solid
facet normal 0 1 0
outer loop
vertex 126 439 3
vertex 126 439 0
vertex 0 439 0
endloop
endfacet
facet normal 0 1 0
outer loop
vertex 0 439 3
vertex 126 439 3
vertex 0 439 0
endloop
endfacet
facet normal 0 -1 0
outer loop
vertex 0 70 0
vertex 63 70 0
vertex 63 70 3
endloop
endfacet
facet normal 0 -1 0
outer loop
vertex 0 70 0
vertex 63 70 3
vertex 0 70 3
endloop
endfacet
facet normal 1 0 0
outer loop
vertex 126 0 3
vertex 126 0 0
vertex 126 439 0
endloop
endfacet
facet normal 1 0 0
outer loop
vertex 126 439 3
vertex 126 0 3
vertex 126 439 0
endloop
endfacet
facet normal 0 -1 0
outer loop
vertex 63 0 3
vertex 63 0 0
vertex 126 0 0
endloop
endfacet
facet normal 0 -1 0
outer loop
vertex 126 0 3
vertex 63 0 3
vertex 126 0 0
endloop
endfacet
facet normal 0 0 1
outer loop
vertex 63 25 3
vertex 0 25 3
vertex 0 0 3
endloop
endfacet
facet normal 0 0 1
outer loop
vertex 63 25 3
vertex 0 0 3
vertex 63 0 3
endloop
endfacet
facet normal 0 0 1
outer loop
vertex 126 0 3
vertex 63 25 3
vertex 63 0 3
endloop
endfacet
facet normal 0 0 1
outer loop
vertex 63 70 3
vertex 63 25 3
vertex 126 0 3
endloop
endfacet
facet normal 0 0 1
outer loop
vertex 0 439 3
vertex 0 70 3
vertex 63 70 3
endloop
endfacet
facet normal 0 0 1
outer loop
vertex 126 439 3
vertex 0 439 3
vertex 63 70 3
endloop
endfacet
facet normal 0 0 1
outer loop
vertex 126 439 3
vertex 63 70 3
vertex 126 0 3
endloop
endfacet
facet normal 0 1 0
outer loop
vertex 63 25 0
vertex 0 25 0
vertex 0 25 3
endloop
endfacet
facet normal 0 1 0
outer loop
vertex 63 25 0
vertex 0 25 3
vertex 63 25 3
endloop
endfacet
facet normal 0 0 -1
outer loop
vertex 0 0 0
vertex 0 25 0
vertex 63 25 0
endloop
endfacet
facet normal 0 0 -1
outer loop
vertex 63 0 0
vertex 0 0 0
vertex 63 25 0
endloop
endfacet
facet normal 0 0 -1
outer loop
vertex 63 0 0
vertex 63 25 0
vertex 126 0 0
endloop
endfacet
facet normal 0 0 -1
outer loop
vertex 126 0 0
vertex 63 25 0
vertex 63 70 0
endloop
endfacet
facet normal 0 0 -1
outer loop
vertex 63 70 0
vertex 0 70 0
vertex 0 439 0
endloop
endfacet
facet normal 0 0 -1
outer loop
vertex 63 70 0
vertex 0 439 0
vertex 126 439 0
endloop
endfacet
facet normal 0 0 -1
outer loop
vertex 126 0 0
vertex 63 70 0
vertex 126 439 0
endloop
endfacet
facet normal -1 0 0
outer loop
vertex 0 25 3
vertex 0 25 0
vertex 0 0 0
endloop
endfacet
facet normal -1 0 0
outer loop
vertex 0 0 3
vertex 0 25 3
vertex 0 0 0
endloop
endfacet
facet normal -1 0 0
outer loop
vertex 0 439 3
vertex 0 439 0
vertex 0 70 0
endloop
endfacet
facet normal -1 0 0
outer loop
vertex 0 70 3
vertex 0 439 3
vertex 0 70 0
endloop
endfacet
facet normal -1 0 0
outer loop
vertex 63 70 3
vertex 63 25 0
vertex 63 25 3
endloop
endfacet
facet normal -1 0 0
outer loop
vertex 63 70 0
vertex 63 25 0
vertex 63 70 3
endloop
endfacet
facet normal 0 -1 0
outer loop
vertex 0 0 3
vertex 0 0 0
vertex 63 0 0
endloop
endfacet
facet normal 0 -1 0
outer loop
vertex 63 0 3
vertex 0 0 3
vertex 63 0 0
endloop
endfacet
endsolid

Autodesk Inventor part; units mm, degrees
ref_plane "YZ Plane" through (0, 0, 0) normal (1, 0, 0) x (0, 1, 0)
ref_plane "XZ Plane" through (0, 0, 0) normal (0, 1, 0) x (-1, 0, 0)
ref_plane "XY Plane" through (0, 0, 0) normal (0, 0, 1) x (1, 0, 0)
sketch "Sketch2" plane through (0, 0, 0) normal (0, 0, 1) x (1, 0, 0)
  line L0 (0, 0) -> (126, 0)
  line L1 (126, 0) -> (126, 439)
  line L2 (126, 439) -> (0, 439)
  line L3 (0, 439) -> (0, 0)
  line L4 (0, 25) -> (63, 25)
  line L5 (63, 0) -> (0, 0)
  line L6 (0, 0) -> (0, 25)
  line L7 (63, 25) -> (63, 70)
  line L8 (63, 70) -> (0, 70)
  point P0 (63, 47.5)
  dimension "d0" = 126
  dimension "d1" = 439
  dimension "d2" = 25
  dimension "d3" = 45
  dimension "d4" = 63
extrude "Extrusion1" add sketch "Sketch2" along normal blind 3 contours L3 L4 L7 L8 L2 L1 L0
properties part number "ackleryk" material "PMMA Plastic"
